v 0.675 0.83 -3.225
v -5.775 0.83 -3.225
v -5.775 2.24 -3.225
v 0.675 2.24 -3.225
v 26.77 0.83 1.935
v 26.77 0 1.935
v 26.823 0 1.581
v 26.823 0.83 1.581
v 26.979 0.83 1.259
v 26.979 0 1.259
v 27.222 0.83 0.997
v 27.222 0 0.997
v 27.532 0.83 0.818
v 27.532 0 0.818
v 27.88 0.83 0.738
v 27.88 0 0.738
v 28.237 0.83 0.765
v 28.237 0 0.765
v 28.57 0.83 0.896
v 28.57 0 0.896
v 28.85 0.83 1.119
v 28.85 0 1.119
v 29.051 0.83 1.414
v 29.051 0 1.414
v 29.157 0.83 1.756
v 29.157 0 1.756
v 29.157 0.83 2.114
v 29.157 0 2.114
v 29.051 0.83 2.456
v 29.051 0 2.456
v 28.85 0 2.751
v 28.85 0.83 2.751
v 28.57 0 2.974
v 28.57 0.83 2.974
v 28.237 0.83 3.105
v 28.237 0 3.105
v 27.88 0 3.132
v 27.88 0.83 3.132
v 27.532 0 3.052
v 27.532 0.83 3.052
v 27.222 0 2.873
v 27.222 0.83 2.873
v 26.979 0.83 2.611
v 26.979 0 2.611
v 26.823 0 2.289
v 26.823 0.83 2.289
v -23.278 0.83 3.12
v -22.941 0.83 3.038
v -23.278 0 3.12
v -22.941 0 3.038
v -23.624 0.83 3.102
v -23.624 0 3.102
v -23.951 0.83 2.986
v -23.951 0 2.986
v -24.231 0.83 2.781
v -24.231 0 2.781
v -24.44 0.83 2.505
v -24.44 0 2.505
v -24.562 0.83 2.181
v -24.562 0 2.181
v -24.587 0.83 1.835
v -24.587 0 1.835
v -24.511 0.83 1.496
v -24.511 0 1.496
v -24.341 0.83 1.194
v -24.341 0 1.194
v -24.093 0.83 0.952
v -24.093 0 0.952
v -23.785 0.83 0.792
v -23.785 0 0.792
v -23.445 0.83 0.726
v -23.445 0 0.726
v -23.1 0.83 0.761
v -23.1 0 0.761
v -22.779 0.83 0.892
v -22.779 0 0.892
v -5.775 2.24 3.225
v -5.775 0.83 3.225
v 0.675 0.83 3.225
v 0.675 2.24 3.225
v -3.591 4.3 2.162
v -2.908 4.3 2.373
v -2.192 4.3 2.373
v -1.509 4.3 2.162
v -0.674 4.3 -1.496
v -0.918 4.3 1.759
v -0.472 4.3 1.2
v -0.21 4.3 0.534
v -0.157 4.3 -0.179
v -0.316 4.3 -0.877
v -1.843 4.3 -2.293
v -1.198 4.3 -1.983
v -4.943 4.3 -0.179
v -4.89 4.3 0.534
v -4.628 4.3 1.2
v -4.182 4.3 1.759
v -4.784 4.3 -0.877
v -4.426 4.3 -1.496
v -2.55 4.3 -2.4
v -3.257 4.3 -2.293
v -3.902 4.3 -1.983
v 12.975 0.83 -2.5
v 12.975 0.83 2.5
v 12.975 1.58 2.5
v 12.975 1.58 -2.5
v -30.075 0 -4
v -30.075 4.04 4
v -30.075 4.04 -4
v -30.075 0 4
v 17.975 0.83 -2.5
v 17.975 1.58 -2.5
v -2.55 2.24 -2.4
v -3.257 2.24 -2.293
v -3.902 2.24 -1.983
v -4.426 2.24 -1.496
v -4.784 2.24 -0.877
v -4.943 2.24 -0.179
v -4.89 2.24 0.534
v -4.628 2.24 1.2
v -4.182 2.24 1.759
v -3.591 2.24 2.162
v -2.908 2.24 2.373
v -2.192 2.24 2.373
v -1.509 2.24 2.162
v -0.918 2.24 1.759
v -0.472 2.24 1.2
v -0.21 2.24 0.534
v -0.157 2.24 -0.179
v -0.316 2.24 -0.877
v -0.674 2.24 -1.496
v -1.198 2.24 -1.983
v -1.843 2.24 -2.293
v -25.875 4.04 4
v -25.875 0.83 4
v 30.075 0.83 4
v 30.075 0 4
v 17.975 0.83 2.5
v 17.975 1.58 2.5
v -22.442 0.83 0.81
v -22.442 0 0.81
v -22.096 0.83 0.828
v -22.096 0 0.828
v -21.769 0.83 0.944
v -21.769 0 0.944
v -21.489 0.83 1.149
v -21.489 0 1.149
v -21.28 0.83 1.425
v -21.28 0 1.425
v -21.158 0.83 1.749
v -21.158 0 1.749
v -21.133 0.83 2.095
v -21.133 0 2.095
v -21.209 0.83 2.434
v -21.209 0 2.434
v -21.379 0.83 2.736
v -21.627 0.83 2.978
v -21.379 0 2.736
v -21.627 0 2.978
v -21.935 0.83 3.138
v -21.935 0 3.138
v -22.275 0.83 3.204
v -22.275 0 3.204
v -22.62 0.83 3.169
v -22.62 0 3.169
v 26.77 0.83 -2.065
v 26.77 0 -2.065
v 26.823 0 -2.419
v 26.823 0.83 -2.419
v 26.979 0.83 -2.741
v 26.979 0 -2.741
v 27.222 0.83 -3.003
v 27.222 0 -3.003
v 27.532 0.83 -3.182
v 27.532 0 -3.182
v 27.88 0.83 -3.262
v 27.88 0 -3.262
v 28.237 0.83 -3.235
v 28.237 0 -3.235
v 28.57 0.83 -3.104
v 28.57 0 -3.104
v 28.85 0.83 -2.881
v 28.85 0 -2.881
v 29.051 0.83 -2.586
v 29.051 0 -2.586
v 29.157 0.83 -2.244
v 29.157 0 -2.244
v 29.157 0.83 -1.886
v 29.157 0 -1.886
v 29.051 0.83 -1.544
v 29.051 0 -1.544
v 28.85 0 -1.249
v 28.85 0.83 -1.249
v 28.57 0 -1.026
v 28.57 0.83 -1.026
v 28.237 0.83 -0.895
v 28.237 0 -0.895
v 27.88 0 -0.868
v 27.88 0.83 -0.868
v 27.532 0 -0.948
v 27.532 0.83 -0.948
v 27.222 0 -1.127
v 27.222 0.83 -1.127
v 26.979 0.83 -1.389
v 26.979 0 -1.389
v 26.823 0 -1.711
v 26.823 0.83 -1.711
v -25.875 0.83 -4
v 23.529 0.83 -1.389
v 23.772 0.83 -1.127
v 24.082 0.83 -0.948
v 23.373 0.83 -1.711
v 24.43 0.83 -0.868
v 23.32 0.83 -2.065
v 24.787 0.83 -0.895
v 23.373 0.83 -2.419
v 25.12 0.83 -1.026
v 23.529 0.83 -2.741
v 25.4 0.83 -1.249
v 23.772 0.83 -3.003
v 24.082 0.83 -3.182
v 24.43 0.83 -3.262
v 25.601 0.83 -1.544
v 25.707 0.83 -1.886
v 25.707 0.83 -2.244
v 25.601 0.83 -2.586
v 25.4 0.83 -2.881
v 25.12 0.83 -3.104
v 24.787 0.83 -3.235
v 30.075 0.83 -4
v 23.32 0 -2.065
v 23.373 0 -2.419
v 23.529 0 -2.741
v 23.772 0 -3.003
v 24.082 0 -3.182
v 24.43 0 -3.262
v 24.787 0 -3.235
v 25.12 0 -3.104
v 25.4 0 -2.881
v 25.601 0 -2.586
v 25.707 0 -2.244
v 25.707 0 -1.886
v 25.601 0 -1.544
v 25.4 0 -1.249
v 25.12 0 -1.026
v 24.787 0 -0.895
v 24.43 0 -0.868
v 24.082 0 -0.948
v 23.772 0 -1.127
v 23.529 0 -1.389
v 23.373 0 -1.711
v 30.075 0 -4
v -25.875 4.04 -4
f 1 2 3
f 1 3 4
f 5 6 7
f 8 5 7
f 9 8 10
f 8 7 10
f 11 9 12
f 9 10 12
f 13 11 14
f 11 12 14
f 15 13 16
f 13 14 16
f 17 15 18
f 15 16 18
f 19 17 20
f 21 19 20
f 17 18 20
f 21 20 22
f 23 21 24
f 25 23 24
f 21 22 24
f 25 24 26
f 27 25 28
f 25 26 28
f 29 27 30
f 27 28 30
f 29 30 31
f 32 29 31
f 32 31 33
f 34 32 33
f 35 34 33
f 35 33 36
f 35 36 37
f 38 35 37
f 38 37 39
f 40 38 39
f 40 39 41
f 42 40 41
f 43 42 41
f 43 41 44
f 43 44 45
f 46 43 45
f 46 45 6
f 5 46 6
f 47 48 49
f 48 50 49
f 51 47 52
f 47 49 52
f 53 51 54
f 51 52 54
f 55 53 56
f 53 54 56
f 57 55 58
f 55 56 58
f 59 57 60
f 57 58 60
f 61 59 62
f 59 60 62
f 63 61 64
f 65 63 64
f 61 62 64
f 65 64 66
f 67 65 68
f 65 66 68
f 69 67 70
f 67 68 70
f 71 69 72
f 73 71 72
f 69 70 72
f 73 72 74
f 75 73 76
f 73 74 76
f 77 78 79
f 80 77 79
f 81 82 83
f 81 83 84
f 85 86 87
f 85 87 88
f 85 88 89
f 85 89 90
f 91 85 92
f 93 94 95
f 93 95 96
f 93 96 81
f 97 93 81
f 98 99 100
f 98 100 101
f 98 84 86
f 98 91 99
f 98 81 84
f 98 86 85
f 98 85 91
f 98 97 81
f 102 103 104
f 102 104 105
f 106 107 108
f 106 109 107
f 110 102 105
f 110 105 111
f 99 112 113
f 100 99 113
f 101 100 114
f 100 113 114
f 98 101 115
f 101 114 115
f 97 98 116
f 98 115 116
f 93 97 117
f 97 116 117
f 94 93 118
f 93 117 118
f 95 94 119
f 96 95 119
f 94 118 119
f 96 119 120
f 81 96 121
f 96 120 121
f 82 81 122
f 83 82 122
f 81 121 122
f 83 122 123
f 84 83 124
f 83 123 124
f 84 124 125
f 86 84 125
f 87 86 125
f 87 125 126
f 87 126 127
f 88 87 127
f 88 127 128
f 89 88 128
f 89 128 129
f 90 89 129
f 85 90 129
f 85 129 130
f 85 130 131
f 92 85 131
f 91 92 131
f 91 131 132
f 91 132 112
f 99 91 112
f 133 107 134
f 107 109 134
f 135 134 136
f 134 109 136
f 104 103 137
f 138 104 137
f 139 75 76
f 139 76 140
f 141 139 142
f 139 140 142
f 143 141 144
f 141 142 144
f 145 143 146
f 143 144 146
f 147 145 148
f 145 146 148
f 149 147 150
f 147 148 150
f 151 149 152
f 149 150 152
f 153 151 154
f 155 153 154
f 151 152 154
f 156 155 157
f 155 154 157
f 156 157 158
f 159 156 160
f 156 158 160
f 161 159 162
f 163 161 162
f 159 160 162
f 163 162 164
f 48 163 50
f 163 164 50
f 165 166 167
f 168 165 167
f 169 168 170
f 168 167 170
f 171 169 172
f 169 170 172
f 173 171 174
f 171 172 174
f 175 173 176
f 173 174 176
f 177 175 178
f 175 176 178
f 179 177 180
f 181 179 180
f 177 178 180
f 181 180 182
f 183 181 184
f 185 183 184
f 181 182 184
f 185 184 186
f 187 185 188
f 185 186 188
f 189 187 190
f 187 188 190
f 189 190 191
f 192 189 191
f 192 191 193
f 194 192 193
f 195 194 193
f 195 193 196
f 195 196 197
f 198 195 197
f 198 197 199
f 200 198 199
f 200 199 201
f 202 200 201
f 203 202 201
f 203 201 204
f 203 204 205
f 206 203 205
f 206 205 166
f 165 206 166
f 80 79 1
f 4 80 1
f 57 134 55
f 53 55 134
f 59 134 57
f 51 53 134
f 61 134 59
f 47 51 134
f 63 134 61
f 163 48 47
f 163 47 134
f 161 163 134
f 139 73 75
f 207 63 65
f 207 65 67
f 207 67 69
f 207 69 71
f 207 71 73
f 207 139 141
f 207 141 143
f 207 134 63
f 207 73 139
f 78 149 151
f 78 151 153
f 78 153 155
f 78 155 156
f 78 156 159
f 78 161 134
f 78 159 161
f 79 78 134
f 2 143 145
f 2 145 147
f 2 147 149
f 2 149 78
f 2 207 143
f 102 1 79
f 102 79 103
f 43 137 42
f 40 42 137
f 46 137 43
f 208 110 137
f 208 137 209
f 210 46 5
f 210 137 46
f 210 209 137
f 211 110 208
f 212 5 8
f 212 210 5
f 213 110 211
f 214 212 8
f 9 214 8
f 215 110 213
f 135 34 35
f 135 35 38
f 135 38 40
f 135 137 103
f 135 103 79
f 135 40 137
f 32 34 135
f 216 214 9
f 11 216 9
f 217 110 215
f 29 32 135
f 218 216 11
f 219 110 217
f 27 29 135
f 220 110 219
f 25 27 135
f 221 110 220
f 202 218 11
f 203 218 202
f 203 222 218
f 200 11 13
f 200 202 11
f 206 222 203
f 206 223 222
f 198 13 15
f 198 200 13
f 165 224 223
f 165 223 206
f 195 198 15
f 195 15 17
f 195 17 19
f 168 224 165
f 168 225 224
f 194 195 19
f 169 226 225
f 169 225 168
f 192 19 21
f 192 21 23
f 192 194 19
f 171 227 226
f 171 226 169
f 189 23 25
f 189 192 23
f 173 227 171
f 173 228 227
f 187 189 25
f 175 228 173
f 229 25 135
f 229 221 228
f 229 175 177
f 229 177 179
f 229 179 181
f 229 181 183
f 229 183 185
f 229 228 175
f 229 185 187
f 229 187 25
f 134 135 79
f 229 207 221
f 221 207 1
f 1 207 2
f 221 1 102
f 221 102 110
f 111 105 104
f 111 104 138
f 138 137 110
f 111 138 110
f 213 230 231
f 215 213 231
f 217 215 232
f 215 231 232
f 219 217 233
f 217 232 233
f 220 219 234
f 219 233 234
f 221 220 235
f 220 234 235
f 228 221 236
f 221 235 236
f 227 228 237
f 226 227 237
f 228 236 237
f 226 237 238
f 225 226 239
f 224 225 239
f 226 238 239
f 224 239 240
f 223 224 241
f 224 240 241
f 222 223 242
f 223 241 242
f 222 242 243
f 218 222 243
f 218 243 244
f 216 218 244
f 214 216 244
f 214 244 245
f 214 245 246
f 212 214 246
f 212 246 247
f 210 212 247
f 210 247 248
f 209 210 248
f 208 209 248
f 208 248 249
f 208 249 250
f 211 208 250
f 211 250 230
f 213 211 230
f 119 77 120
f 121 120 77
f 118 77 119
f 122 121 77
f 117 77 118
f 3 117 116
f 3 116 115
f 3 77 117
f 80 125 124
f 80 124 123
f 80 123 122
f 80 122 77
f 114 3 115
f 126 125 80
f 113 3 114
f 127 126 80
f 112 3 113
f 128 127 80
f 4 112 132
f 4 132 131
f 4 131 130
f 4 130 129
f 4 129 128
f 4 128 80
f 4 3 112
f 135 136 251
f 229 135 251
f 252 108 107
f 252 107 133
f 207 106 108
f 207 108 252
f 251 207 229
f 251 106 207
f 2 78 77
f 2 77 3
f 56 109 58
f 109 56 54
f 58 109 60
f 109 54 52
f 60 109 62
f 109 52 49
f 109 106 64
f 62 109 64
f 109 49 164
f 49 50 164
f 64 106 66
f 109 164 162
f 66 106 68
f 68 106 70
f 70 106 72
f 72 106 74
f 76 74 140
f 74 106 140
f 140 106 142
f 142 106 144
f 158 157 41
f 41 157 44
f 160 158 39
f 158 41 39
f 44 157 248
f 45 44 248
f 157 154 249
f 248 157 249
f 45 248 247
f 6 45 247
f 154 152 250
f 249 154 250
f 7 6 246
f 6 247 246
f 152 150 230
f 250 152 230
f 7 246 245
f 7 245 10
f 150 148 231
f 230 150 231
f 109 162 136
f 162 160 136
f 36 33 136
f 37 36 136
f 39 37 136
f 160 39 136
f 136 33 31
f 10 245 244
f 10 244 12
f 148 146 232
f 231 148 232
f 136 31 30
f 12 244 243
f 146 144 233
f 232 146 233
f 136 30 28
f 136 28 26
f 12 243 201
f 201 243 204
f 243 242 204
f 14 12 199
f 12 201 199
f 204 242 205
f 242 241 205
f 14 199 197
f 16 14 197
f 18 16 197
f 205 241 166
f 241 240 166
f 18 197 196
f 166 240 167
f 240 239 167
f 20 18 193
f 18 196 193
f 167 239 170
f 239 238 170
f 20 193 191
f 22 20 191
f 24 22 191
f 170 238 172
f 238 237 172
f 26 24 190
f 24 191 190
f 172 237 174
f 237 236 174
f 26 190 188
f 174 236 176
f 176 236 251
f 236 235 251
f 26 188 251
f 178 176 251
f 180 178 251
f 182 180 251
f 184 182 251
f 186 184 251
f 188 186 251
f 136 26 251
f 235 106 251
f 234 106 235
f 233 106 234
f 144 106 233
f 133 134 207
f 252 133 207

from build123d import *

# Parameters (mm, degrees)
SKETCH1_W            = 60.15
SKETCH1_H            = 8
BOSS_EXTRUDE1_DEPTH  = 0.83
SKETCH2_W            = 6.45
SKETCH2_H            = 6.45
SKETCH2_R            = 2.4
BOSS_EXTRUDE2_DEPTH  = 1.41
SKETCH2_3_R          = 2.4
BOSS_EXTRUDE3_DEPTH  = 3.47
SKETCH3_W            = 4.2
SKETCH3_H            = 8
BOSS_EXTRUDE4_DEPTH  = 3.21
M2_CLEARANCE_HOLE1_D = 2.4
SKETCH6_W            = 5
SKETCH6_H            = 5
BOSS_EXTRUDE5_DEPTH  = 0.75


with BuildPart() as part:
    # Sketch1 → Boss-Extrude1 (new body)
    with BuildSketch(Plane(origin=(0, 0, 0), x_dir=(1, 0, 0), z_dir=(0, 1, 0))):
        Rectangle(SKETCH1_W, SKETCH1_H)
    extrude(amount=BOSS_EXTRUDE1_DEPTH)

    # Sketch2 → Boss-Extrude2 (add)
    # profile 1 of 2: a face of its own
    with BuildSketch(Plane(origin=(0, 0.83, 0), x_dir=(1, 0, 0), z_dir=(0, 1, 0))):
        with Locations((-2.55, 0)):
            Rectangle(SKETCH2_W, SKETCH2_H)
        with Locations((-2.55, 0)):
            Circle(SKETCH2_R, mode=Mode.SUBTRACT)
    # profile 2 of 2: a face of its own
    with BuildSketch(Plane(origin=(0, 0.83, 0), x_dir=(1, 0, 0), z_dir=(0, 1, 0))):
        with Locations((-2.55, 0)):
            Circle(SKETCH2_R)
    extrude(amount=BOSS_EXTRUDE2_DEPTH)

    # Sketch2<3> → Boss-Extrude3 (add)
    with BuildSketch(Plane(origin=(0, 0.83, 0), x_dir=(1, 0, 0), z_dir=(0, 1, 0))):
        with Locations(Location((-2.55, 0, 0), (0, 0, 90))):
            Circle(SKETCH2_3_R)
    extrude(amount=BOSS_EXTRUDE3_DEPTH)

    # Sketch3 → Boss-Extrude4 (add)
    with BuildSketch(Plane(origin=(0, 0.83, 0), x_dir=(1, 0, 0), z_dir=(0, 1, 0))):
        with Locations((-27.975, 0)):
            Rectangle(SKETCH3_W, SKETCH3_H)
    extrude(amount=BOSS_EXTRUDE4_DEPTH)

    # M2 Clearance Hole1 (through all)
    with Locations(Plane(origin=(0, 0.83, 0), x_dir=(1, 0, 0), z_dir=(0, 1, 0))):
        with Locations((24.52, 2.065), (27.97, 2.065), (27.97, -1.935), (-23.39, -1.925), (-22.33, -2.005)):
            Hole(M2_CLEARANCE_HOLE1_D / 2)

    # Sketch6 → Boss-Extrude5 (add)
    with BuildSketch(Plane(origin=(0, 0.83, 0), x_dir=(1, 0, 0), z_dir=(0, 1, 0))):
        with Locations((15.475, 0)):
            Rectangle(SKETCH6_W, SKETCH6_H)
    extrude(amount=BOSS_EXTRUDE5_DEPTH)


solid = part.part
